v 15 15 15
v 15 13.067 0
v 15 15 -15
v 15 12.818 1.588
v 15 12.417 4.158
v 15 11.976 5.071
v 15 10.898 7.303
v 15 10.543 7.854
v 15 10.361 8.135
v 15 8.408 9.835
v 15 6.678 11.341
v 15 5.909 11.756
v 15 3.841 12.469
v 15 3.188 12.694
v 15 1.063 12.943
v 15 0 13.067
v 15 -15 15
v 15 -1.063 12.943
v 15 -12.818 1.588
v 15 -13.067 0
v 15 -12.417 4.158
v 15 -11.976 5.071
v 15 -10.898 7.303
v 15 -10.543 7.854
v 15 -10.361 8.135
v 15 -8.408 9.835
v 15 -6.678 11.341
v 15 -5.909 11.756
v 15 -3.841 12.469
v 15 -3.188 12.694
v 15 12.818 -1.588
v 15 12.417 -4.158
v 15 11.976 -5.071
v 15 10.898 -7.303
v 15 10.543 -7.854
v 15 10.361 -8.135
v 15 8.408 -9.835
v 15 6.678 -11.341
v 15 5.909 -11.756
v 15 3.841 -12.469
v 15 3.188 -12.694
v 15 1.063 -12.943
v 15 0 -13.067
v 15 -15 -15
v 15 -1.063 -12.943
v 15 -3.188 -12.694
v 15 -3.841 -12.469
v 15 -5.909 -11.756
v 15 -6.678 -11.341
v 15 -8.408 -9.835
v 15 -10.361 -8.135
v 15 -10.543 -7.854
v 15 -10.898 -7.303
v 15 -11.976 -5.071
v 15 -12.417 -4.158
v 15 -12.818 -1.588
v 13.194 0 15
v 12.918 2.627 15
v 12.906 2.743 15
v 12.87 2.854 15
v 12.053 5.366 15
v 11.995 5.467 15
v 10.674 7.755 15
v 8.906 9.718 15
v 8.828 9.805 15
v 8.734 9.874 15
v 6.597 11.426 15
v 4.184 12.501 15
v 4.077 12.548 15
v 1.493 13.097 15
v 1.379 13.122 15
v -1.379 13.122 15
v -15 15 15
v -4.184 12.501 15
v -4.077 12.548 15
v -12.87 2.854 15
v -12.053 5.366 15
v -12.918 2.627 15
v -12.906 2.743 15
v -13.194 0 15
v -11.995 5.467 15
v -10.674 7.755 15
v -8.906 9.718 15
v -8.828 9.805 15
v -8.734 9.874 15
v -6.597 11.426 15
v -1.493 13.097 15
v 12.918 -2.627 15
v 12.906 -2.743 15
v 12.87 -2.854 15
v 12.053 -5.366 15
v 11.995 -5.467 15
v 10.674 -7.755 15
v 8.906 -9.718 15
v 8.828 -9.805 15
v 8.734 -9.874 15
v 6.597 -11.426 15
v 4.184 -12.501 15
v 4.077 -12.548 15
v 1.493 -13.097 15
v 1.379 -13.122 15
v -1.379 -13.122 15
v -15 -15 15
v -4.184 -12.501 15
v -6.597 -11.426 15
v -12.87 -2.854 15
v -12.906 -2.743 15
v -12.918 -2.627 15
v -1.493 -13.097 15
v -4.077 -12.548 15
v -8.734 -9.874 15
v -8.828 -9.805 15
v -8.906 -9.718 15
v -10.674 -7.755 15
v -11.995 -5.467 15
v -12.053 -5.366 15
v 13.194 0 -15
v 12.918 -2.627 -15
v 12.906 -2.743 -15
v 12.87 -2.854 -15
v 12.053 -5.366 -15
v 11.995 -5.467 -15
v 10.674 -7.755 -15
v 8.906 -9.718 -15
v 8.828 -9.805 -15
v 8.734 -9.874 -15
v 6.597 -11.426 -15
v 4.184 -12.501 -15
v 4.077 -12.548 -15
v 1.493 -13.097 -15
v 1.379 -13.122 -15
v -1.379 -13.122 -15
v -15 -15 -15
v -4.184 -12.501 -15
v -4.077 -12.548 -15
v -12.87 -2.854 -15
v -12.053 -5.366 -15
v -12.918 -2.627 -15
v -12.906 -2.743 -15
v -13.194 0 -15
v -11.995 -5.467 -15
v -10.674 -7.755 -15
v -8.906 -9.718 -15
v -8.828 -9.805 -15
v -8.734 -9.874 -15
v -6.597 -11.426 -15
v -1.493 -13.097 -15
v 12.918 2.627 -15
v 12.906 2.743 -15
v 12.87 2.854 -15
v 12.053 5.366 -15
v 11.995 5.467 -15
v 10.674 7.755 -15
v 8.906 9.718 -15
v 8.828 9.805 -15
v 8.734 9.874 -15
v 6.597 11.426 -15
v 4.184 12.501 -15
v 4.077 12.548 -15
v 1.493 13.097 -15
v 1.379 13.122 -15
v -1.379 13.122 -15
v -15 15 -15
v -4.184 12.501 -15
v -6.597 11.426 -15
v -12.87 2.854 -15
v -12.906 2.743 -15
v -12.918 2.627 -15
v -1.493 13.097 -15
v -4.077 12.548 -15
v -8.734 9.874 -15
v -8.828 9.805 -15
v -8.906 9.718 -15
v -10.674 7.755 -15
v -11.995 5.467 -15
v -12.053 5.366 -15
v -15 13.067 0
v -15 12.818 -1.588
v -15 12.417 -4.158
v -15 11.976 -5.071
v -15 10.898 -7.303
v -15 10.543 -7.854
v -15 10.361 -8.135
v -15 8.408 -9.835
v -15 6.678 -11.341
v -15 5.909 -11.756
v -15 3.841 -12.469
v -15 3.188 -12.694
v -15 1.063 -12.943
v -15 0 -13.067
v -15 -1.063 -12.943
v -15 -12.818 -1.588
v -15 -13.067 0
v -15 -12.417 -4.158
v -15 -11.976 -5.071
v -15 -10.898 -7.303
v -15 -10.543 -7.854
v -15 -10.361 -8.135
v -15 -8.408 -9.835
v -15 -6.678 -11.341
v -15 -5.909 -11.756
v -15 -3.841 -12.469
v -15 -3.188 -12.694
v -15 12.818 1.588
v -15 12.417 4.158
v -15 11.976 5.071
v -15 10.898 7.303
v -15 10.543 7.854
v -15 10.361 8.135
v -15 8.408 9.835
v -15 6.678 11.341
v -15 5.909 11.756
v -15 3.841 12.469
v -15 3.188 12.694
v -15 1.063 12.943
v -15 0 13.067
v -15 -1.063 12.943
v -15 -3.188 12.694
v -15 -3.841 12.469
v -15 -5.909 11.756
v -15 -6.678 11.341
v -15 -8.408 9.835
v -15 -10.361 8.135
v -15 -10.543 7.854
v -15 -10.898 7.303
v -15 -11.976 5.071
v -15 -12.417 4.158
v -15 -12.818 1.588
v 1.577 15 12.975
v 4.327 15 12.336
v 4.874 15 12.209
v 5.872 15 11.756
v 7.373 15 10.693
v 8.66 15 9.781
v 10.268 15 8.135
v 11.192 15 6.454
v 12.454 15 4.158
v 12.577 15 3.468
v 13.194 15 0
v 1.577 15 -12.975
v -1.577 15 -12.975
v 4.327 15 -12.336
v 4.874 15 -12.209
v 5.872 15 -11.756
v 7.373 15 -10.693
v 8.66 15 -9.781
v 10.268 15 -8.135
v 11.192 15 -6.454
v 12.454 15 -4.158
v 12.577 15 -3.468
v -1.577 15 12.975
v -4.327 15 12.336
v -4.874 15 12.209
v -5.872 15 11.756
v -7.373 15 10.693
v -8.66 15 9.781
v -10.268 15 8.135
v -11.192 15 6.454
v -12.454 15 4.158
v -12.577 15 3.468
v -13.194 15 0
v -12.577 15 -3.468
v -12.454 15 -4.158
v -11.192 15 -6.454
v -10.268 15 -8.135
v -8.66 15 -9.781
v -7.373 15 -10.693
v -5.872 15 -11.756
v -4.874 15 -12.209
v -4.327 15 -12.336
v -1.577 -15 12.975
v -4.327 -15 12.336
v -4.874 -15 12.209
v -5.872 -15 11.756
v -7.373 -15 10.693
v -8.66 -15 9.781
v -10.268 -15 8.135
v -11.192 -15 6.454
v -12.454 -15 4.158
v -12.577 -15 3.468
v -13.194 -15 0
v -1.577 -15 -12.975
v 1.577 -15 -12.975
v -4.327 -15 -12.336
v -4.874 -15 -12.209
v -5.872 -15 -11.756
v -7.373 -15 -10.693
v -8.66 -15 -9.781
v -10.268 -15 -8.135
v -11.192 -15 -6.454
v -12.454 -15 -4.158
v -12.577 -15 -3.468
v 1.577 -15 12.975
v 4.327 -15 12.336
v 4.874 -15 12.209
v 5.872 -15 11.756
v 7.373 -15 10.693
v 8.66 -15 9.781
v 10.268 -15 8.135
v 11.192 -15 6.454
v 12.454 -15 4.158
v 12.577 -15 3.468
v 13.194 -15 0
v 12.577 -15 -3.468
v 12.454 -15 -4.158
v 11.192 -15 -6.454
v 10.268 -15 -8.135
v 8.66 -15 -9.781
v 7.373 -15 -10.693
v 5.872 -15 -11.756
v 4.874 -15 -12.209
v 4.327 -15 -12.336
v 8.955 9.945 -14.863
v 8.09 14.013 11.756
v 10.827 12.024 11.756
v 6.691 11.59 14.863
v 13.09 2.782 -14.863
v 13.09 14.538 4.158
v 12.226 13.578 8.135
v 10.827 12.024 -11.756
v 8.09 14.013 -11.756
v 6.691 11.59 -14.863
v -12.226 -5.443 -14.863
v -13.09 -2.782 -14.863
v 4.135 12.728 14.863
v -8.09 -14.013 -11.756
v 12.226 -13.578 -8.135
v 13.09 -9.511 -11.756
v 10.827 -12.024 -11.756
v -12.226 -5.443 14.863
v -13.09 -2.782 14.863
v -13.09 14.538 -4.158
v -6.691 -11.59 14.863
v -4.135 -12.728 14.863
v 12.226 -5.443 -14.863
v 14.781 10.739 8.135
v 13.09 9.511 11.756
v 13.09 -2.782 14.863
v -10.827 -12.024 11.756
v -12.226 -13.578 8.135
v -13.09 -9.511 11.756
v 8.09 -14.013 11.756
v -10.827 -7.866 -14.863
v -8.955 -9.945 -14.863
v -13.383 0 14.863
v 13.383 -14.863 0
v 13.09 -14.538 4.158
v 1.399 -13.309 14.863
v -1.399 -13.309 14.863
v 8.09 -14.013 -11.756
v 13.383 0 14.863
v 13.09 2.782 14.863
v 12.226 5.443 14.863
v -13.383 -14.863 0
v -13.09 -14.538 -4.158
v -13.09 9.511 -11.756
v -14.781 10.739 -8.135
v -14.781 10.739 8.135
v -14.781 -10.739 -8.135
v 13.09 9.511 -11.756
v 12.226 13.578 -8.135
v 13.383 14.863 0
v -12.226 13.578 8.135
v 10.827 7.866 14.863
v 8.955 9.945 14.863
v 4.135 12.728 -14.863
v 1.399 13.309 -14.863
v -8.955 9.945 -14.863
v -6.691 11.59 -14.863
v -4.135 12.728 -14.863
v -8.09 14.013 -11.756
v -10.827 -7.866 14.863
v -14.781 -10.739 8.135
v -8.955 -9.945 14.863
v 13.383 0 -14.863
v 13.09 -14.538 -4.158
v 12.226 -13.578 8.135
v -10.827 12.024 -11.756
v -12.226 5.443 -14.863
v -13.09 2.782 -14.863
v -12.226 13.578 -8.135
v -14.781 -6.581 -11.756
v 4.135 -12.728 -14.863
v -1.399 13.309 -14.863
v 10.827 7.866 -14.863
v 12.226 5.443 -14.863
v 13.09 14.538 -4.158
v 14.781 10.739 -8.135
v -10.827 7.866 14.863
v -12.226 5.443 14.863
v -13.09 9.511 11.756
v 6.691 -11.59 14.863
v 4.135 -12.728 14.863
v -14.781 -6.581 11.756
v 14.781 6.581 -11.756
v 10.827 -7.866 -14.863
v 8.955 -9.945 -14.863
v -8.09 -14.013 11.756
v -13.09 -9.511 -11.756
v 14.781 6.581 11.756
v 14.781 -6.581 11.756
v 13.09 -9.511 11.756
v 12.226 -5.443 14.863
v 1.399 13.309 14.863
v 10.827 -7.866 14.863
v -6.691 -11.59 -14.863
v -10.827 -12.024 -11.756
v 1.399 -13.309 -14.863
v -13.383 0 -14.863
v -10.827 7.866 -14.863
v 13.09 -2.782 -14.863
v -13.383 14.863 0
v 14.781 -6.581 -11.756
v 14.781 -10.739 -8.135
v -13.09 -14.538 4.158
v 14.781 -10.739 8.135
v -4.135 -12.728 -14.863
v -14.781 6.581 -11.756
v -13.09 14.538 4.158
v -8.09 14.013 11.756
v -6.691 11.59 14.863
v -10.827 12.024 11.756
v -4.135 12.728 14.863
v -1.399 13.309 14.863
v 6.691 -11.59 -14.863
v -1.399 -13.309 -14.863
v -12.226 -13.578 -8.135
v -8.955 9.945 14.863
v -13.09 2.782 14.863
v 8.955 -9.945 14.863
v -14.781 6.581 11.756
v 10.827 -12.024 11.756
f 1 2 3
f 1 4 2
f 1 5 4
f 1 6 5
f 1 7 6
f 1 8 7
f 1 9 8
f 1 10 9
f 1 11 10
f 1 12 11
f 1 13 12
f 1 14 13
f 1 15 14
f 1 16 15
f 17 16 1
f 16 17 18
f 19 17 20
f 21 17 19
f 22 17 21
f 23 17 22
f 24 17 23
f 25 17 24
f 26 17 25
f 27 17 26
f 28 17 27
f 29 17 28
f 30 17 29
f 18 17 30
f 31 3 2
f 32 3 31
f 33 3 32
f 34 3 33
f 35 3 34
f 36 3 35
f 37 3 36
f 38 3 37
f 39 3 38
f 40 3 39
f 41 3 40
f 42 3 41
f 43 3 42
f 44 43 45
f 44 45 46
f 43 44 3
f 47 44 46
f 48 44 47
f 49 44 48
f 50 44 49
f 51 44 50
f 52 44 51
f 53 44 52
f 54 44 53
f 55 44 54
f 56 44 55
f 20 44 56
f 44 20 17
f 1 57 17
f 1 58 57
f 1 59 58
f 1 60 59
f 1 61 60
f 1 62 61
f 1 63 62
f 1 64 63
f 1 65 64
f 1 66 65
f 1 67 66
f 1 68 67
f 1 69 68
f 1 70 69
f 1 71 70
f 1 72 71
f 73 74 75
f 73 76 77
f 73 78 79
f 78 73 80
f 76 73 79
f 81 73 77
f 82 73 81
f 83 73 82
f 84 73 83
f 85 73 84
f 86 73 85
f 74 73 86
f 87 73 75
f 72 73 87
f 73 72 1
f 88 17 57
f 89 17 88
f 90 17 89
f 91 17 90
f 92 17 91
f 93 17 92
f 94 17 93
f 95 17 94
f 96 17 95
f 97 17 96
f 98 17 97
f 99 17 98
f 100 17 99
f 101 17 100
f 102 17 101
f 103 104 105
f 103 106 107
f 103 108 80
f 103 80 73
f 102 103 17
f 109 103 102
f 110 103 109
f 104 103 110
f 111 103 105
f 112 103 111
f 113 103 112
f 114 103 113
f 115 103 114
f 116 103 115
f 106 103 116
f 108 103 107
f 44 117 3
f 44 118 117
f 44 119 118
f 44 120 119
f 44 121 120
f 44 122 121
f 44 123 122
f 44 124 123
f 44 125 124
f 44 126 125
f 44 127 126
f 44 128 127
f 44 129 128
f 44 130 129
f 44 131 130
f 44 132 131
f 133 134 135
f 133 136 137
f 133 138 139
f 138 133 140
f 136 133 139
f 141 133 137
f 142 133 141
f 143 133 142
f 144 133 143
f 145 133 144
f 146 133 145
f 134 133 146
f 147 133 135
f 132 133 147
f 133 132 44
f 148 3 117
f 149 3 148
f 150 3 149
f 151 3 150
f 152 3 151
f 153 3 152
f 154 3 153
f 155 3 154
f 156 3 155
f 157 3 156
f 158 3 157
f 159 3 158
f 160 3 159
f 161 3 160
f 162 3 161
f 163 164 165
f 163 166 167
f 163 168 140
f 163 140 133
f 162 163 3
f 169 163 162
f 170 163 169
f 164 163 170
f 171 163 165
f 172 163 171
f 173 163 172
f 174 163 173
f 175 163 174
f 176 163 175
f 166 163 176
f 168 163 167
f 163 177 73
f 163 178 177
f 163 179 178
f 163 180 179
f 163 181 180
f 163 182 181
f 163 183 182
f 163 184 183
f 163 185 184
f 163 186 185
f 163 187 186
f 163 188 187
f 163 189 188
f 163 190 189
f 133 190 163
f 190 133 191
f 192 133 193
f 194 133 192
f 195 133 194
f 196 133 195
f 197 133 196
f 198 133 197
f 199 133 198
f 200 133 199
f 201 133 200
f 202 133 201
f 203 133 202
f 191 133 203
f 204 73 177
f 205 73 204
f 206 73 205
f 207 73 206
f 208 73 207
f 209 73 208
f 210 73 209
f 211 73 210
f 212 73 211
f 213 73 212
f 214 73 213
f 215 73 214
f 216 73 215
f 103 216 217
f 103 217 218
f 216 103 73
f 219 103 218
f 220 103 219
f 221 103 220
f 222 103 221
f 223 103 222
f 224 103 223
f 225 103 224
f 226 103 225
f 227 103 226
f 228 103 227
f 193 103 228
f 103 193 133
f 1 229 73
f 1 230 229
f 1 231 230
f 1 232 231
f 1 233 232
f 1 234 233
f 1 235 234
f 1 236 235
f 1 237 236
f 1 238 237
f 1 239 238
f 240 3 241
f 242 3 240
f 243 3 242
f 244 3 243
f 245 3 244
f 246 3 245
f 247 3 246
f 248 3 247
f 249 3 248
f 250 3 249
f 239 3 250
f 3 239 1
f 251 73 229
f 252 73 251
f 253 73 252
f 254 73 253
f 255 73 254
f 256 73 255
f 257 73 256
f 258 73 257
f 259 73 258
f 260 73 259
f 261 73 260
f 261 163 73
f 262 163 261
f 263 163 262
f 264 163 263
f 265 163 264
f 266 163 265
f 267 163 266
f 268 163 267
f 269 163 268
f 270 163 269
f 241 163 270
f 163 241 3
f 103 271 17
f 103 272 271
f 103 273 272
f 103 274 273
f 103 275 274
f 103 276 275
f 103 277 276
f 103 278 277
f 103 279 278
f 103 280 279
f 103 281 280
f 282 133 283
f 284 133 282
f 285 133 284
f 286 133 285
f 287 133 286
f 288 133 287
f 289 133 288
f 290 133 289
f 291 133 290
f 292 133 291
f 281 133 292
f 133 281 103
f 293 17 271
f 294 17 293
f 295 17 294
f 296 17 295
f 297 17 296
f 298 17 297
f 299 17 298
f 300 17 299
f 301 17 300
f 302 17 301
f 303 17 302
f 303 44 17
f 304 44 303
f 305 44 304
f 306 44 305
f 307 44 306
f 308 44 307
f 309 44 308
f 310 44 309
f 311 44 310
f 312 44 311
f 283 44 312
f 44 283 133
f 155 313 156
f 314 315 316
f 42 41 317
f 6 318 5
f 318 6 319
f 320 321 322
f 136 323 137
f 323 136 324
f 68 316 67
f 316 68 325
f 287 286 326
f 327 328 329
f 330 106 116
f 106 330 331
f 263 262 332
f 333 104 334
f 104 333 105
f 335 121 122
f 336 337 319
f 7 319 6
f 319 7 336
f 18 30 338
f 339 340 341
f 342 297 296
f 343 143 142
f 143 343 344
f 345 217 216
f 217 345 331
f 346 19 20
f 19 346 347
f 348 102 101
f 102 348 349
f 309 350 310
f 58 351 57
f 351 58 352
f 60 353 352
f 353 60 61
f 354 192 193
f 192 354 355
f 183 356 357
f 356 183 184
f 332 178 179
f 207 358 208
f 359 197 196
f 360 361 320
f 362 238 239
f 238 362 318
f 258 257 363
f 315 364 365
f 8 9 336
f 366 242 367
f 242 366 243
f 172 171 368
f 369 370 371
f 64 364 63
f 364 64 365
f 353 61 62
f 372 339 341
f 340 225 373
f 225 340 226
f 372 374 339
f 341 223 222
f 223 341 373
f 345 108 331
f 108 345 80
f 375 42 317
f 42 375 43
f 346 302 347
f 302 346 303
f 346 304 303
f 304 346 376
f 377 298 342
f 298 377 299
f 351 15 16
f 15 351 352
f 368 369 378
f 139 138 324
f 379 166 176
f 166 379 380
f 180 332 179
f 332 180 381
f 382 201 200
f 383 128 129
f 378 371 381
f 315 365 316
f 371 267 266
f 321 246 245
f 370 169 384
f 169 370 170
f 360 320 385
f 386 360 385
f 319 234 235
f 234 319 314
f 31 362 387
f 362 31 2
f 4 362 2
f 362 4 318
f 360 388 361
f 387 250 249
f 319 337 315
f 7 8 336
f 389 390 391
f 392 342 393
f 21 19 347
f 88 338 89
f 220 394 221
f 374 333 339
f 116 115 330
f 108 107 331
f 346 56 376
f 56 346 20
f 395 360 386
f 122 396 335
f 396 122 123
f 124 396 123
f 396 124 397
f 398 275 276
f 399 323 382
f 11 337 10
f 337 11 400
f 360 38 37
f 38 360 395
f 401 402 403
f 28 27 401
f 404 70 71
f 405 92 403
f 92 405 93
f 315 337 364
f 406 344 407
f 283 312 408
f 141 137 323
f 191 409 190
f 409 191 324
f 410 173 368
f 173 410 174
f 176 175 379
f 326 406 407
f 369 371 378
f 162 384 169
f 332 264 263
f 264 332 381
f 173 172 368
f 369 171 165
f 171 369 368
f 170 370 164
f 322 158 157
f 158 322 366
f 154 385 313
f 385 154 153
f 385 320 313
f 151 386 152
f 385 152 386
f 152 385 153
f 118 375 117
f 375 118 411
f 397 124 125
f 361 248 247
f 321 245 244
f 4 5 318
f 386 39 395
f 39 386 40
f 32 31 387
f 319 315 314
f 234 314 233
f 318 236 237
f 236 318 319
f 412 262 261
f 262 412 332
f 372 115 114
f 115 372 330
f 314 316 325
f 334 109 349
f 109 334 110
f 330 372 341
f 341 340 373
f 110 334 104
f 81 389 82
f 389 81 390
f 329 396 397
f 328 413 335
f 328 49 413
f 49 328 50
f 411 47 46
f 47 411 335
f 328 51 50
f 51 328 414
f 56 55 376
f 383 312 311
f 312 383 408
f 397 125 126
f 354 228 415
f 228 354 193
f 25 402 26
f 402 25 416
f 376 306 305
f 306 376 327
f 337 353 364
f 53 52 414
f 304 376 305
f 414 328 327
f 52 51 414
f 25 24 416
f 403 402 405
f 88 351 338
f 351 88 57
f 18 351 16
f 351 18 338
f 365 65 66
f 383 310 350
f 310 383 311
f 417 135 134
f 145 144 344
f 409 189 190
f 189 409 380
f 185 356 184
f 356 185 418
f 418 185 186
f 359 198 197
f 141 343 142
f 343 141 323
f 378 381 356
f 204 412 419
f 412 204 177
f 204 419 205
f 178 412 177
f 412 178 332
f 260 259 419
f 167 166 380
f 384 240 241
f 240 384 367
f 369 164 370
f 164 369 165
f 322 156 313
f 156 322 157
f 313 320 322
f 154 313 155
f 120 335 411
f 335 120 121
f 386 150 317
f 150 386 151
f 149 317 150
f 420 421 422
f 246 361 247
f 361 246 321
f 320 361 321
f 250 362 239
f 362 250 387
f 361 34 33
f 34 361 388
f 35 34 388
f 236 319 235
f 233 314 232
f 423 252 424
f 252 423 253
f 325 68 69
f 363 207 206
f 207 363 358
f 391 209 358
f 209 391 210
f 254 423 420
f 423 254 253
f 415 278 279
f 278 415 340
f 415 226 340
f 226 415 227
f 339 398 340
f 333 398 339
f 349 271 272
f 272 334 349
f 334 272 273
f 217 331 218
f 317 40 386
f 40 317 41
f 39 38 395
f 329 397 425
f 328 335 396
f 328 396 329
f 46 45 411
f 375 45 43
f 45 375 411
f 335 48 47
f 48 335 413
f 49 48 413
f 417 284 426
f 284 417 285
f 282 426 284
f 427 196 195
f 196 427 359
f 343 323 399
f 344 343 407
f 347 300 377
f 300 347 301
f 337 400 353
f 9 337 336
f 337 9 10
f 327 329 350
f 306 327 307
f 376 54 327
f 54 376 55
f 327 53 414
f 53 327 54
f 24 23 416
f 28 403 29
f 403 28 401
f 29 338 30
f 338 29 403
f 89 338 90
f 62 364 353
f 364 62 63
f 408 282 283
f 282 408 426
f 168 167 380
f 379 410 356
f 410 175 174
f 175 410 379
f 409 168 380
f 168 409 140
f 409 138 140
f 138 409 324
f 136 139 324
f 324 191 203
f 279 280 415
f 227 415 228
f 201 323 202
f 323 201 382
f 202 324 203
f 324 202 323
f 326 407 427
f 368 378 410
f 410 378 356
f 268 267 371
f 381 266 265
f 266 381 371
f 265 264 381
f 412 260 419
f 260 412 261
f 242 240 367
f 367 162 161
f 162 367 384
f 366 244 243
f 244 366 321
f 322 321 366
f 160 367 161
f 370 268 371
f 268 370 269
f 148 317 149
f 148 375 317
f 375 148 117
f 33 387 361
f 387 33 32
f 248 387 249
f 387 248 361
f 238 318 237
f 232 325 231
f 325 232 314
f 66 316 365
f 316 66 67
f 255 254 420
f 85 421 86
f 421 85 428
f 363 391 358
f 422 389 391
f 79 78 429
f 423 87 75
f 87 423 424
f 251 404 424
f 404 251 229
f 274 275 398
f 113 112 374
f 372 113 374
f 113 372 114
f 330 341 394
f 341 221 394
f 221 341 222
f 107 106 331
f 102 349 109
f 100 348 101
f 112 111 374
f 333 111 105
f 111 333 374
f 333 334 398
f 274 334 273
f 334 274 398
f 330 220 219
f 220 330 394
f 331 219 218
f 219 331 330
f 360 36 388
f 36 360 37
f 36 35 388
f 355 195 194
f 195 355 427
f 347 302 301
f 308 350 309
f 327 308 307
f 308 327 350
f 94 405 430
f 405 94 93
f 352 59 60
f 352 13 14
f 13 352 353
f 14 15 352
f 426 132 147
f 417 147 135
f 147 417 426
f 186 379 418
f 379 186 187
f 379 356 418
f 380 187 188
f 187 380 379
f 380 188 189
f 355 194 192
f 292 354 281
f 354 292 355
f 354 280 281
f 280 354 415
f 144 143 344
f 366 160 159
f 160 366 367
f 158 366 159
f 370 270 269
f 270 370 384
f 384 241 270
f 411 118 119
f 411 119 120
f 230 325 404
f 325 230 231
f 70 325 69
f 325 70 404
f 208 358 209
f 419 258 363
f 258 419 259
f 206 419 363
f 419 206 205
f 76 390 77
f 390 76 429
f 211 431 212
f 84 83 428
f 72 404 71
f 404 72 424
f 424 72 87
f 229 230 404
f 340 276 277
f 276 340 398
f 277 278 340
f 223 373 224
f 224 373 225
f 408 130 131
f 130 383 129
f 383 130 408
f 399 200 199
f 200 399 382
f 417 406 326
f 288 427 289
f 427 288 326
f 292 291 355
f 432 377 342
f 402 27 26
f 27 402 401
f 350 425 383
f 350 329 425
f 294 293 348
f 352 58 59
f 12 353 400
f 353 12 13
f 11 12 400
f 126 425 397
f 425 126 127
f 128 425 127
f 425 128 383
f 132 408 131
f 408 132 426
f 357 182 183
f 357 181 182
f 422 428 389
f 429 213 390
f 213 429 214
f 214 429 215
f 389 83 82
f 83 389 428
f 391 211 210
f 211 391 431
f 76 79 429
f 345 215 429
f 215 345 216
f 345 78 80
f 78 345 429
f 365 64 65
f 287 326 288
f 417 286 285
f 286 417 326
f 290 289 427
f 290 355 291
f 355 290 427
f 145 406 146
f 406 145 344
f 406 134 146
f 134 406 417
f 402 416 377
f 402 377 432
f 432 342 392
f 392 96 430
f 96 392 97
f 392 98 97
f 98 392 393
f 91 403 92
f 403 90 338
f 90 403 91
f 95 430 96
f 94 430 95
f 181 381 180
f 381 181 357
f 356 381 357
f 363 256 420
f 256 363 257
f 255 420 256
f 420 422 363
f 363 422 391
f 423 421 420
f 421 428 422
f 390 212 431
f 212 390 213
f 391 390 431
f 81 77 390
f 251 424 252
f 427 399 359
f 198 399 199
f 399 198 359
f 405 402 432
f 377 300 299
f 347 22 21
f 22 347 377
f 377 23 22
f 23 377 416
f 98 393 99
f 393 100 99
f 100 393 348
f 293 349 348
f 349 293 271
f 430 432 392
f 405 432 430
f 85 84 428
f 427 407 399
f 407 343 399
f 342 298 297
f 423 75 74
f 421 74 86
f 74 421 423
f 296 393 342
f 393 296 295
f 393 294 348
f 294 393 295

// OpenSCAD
module example004()
{
	difference() {
		cube(30, center = true);
		sphere(20);
	}
}

echo(version=version());

example004();

// Written by Clifford Wolf <clifford@clifford.at> and Marius
// Kintel <marius@kintel.net>
//
// To the extent possible under law, the author(s) have dedicated all
// copyright and related and neighboring rights to this software to the
// public domain worldwide. This software is distributed without any
// warranty.
//
// You should have received a copy of the CC0 Public Domain
// Dedication along with this software.
// If not, see <http://creativecommons.org/publicdomain/zero/1.0/>.
